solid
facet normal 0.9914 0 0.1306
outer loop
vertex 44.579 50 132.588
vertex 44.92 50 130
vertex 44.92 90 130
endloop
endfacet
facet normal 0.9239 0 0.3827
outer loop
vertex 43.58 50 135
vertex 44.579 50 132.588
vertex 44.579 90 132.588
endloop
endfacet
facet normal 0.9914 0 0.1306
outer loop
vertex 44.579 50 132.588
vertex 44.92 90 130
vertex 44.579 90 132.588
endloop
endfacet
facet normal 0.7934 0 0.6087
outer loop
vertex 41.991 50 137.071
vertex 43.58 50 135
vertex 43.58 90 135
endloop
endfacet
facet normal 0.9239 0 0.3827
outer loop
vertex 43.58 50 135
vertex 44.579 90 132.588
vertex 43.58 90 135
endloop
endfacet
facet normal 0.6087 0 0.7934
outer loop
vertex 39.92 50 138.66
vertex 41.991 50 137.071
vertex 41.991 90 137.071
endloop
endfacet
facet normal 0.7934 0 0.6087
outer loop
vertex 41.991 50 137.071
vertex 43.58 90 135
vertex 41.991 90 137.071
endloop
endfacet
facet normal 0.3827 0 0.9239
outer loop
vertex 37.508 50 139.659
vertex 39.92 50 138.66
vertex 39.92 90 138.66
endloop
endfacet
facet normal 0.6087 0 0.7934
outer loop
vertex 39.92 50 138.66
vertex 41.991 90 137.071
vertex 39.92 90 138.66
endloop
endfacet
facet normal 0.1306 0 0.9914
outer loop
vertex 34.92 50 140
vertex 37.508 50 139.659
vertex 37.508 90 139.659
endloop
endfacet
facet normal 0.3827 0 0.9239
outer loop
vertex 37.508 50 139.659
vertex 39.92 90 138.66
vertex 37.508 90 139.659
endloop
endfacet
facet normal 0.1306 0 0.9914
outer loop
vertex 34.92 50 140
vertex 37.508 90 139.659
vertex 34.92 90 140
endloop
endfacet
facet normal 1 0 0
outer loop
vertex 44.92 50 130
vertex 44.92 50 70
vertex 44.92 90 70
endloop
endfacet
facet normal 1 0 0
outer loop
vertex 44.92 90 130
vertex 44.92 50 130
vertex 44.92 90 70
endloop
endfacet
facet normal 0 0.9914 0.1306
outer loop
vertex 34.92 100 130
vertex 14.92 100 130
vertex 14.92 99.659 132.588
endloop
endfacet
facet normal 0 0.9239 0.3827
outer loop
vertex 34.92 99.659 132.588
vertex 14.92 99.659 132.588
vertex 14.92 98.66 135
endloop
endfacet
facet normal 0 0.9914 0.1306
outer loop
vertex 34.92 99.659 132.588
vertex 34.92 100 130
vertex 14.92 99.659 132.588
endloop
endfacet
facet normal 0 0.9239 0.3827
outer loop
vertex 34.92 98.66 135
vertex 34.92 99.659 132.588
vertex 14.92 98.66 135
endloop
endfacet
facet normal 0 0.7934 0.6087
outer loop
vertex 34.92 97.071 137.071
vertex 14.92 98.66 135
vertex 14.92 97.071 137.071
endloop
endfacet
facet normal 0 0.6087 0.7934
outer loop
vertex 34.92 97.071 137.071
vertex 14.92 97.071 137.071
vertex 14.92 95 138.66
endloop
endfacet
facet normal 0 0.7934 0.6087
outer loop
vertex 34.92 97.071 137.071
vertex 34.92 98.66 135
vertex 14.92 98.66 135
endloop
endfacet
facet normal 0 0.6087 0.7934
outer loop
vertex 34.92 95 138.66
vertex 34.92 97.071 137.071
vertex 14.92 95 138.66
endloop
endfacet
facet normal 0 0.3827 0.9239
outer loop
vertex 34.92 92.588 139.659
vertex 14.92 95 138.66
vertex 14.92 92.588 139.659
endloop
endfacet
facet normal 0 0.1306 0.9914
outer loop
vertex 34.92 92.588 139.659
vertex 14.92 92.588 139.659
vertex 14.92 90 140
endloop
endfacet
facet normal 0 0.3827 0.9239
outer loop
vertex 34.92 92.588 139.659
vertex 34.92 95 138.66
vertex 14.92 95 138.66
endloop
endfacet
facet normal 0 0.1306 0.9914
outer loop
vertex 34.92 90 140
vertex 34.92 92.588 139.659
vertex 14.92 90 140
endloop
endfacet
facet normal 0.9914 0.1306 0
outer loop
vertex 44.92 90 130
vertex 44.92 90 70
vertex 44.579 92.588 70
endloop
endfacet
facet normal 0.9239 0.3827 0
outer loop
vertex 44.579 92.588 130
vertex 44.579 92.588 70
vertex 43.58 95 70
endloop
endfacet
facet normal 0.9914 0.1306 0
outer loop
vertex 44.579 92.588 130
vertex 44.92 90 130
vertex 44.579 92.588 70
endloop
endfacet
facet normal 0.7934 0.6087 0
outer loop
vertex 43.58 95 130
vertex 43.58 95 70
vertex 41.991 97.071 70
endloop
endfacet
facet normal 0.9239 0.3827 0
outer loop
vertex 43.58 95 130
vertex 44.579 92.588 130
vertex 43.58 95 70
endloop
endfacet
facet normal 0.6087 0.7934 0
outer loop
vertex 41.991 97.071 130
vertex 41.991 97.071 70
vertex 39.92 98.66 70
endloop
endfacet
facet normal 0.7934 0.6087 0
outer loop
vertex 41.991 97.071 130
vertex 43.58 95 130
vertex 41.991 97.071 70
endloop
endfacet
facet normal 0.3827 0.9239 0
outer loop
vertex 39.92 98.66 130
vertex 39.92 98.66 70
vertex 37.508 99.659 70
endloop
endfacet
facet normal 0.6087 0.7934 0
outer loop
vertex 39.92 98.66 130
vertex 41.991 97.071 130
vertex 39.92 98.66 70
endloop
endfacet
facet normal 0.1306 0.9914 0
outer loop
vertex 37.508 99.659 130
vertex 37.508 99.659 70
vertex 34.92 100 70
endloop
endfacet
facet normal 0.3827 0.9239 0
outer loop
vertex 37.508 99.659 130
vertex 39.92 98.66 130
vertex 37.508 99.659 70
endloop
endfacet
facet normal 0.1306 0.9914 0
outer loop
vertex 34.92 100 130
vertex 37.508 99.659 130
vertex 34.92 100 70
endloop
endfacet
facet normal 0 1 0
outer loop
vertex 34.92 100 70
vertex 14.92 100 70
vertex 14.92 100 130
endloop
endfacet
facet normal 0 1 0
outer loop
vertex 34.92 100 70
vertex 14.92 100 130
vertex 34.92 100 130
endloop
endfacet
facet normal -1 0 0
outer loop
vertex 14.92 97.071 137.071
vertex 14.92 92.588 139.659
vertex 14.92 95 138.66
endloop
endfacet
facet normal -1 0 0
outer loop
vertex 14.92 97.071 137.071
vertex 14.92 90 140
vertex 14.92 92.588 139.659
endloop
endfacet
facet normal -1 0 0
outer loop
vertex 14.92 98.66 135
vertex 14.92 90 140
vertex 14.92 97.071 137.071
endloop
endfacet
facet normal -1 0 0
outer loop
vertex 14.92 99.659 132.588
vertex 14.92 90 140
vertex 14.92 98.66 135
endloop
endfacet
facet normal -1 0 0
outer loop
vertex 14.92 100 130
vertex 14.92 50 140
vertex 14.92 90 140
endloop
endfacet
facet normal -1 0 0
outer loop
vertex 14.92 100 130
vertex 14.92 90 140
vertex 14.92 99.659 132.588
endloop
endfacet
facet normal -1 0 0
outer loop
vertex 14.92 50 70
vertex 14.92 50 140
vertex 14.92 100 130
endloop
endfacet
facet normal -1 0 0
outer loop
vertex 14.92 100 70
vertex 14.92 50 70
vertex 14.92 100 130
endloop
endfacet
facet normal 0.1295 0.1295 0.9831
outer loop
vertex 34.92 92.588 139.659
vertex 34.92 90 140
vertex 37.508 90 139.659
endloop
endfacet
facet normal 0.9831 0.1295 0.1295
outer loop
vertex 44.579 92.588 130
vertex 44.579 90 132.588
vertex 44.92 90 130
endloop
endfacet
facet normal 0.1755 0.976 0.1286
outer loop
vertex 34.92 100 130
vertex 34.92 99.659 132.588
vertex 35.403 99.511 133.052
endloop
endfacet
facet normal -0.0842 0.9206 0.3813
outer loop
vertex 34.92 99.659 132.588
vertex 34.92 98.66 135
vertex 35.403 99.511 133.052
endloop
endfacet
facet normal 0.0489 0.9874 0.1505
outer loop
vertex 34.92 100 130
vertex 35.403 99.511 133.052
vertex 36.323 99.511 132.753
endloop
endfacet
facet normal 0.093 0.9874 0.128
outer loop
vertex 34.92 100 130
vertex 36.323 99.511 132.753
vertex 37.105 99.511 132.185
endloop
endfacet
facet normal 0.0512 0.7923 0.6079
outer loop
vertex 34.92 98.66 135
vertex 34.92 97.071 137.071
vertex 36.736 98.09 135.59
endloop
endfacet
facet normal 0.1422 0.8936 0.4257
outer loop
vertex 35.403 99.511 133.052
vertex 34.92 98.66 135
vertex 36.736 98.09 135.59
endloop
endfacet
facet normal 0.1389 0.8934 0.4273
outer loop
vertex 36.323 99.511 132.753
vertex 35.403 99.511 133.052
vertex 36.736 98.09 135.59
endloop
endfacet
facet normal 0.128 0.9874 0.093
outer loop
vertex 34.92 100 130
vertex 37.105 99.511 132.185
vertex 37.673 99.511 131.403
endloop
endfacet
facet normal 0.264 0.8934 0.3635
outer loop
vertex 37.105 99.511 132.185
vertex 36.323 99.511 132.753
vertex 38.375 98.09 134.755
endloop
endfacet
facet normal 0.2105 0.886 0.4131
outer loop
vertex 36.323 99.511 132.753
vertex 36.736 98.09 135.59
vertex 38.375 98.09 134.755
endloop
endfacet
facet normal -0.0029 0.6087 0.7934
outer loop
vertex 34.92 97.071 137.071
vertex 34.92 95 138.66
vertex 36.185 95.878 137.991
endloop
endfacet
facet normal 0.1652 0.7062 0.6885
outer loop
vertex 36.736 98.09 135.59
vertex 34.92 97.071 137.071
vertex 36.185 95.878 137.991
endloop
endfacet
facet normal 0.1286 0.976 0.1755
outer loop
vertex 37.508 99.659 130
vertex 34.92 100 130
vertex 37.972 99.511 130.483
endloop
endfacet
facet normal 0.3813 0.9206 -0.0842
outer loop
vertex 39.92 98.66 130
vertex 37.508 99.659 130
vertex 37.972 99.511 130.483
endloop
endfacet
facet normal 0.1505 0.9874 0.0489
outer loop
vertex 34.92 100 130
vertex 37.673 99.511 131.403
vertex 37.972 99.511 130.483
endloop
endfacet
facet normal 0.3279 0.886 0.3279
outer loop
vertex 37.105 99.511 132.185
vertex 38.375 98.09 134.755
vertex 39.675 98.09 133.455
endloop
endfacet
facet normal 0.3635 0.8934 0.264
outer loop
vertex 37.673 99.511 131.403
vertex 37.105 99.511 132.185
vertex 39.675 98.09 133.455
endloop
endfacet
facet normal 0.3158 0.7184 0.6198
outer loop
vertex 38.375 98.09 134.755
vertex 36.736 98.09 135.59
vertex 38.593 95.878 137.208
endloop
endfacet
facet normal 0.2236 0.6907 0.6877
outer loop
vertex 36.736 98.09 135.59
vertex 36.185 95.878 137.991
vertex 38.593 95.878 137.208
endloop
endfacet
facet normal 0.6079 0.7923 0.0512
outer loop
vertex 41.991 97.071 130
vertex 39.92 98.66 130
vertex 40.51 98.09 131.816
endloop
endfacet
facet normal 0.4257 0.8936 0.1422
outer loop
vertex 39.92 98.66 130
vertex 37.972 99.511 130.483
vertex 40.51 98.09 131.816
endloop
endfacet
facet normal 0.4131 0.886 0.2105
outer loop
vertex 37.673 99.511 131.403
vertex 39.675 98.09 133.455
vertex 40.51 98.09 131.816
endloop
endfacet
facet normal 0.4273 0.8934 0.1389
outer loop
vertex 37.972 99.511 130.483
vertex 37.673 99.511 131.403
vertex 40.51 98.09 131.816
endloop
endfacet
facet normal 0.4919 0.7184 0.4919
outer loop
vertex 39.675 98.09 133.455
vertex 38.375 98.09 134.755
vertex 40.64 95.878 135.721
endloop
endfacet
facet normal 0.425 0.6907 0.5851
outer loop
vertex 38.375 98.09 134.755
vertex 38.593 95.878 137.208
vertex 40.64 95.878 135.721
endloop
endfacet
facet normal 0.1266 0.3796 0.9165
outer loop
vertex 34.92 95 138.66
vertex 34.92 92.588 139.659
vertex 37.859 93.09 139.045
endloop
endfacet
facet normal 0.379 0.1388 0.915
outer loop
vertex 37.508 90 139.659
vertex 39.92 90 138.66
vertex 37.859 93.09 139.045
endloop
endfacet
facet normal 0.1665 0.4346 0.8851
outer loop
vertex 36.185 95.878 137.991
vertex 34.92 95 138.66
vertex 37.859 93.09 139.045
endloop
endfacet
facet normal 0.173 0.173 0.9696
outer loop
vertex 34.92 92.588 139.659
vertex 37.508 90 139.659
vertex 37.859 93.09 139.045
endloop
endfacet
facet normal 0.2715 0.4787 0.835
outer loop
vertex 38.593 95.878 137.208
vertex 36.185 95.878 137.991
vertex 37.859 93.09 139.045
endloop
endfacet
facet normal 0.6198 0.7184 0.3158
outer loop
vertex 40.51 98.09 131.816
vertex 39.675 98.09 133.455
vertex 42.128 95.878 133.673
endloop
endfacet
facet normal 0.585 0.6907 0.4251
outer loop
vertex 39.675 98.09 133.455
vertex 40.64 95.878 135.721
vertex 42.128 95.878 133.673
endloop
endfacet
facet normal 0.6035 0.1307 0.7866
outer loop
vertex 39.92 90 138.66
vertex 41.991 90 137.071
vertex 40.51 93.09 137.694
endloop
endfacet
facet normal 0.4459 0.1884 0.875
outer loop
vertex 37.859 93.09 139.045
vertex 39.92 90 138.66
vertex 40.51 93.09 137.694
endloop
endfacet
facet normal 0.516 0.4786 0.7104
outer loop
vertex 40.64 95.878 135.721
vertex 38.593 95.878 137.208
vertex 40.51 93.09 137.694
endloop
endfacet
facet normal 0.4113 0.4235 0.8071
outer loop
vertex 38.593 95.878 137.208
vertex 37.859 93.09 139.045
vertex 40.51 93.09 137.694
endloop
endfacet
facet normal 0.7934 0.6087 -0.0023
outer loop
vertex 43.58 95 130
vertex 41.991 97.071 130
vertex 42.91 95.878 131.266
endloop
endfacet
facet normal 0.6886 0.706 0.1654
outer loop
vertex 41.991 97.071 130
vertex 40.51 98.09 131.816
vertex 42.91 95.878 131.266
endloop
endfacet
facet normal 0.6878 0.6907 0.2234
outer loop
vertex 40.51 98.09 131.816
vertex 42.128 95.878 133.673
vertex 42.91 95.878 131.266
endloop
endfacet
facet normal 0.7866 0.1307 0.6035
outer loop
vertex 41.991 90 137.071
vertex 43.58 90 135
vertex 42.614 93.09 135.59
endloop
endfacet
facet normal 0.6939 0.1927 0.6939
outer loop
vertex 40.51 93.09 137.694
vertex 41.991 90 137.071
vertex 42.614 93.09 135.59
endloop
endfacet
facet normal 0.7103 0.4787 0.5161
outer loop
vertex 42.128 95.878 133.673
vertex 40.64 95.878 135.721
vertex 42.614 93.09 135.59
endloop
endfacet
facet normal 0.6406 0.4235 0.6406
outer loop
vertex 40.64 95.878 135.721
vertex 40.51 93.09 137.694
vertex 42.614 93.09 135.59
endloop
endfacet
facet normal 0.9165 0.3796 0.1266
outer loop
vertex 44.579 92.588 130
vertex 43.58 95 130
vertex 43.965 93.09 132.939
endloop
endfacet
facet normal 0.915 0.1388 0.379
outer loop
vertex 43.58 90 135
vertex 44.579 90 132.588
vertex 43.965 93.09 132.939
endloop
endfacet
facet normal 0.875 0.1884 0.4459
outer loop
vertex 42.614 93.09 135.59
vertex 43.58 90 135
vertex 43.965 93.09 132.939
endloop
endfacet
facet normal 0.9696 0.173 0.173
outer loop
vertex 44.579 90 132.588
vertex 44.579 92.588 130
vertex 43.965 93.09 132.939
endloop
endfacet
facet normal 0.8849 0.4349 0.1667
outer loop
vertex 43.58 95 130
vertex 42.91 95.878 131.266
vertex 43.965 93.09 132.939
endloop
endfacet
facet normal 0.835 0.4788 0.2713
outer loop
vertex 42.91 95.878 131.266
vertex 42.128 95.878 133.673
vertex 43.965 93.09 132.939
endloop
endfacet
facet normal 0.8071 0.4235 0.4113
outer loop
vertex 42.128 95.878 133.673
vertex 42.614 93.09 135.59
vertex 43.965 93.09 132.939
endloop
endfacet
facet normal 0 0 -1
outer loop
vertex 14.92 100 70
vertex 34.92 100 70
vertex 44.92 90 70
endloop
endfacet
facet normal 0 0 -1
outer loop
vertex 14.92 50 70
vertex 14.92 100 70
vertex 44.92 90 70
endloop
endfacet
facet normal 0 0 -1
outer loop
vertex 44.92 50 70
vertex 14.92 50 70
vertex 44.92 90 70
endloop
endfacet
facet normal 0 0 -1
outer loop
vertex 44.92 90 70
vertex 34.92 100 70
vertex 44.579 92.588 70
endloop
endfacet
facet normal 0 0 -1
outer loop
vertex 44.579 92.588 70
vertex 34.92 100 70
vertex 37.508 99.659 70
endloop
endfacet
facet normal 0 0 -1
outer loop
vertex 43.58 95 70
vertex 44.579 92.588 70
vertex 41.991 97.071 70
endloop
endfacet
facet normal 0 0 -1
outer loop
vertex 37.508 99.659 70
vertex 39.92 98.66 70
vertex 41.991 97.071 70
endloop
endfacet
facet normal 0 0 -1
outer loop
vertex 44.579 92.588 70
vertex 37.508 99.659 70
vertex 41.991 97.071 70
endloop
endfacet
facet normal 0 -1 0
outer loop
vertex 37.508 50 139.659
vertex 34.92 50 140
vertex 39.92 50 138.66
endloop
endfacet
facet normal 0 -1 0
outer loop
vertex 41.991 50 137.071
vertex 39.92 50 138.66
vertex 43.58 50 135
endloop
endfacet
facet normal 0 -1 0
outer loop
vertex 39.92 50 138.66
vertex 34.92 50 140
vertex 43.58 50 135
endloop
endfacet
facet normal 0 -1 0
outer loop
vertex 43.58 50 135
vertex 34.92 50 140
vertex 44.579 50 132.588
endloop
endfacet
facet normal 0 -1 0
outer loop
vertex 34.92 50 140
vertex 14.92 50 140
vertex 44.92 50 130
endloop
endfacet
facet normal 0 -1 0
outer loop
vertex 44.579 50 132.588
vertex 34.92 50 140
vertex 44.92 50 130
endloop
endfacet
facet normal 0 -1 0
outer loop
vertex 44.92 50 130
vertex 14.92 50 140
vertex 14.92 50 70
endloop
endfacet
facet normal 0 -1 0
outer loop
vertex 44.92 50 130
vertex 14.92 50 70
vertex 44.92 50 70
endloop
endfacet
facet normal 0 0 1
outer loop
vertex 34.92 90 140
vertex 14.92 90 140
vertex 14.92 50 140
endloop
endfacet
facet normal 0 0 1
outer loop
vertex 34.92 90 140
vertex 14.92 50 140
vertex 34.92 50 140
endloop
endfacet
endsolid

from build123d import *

# Parameters (mm, degrees)
F0_W     = 30
F0_H     = 50
F1_DEPTH = 70
F3_R     = 10


# Not quite as in the source:
# - a feature of the source that left no trace in its solid (it failed there, or was rolled back) is left out


with BuildPart() as f1:
    # F0 (on Top) → F1 (new body)
    with BuildSketch(Plane.XY):
        with Locations((-0.0802149171, 25)):
            Rectangle(F0_W, F0_H)
    extrude(amount=F1_DEPTH)


with BuildPart() as f1_1:
    # F2: moved
    add(f1.part.moved(Location((30, 50, 70))))

    # F3
    f3_edges = [f1_1.edges().sort_by_distance(p)[0] for p in [
        (44.919785, 75, 140),
        (29.919785, 100, 140),
        (44.919785, 100, 105),
    ]]
    fillet(f3_edges, radius=F3_R)


solid = f1_1.part
